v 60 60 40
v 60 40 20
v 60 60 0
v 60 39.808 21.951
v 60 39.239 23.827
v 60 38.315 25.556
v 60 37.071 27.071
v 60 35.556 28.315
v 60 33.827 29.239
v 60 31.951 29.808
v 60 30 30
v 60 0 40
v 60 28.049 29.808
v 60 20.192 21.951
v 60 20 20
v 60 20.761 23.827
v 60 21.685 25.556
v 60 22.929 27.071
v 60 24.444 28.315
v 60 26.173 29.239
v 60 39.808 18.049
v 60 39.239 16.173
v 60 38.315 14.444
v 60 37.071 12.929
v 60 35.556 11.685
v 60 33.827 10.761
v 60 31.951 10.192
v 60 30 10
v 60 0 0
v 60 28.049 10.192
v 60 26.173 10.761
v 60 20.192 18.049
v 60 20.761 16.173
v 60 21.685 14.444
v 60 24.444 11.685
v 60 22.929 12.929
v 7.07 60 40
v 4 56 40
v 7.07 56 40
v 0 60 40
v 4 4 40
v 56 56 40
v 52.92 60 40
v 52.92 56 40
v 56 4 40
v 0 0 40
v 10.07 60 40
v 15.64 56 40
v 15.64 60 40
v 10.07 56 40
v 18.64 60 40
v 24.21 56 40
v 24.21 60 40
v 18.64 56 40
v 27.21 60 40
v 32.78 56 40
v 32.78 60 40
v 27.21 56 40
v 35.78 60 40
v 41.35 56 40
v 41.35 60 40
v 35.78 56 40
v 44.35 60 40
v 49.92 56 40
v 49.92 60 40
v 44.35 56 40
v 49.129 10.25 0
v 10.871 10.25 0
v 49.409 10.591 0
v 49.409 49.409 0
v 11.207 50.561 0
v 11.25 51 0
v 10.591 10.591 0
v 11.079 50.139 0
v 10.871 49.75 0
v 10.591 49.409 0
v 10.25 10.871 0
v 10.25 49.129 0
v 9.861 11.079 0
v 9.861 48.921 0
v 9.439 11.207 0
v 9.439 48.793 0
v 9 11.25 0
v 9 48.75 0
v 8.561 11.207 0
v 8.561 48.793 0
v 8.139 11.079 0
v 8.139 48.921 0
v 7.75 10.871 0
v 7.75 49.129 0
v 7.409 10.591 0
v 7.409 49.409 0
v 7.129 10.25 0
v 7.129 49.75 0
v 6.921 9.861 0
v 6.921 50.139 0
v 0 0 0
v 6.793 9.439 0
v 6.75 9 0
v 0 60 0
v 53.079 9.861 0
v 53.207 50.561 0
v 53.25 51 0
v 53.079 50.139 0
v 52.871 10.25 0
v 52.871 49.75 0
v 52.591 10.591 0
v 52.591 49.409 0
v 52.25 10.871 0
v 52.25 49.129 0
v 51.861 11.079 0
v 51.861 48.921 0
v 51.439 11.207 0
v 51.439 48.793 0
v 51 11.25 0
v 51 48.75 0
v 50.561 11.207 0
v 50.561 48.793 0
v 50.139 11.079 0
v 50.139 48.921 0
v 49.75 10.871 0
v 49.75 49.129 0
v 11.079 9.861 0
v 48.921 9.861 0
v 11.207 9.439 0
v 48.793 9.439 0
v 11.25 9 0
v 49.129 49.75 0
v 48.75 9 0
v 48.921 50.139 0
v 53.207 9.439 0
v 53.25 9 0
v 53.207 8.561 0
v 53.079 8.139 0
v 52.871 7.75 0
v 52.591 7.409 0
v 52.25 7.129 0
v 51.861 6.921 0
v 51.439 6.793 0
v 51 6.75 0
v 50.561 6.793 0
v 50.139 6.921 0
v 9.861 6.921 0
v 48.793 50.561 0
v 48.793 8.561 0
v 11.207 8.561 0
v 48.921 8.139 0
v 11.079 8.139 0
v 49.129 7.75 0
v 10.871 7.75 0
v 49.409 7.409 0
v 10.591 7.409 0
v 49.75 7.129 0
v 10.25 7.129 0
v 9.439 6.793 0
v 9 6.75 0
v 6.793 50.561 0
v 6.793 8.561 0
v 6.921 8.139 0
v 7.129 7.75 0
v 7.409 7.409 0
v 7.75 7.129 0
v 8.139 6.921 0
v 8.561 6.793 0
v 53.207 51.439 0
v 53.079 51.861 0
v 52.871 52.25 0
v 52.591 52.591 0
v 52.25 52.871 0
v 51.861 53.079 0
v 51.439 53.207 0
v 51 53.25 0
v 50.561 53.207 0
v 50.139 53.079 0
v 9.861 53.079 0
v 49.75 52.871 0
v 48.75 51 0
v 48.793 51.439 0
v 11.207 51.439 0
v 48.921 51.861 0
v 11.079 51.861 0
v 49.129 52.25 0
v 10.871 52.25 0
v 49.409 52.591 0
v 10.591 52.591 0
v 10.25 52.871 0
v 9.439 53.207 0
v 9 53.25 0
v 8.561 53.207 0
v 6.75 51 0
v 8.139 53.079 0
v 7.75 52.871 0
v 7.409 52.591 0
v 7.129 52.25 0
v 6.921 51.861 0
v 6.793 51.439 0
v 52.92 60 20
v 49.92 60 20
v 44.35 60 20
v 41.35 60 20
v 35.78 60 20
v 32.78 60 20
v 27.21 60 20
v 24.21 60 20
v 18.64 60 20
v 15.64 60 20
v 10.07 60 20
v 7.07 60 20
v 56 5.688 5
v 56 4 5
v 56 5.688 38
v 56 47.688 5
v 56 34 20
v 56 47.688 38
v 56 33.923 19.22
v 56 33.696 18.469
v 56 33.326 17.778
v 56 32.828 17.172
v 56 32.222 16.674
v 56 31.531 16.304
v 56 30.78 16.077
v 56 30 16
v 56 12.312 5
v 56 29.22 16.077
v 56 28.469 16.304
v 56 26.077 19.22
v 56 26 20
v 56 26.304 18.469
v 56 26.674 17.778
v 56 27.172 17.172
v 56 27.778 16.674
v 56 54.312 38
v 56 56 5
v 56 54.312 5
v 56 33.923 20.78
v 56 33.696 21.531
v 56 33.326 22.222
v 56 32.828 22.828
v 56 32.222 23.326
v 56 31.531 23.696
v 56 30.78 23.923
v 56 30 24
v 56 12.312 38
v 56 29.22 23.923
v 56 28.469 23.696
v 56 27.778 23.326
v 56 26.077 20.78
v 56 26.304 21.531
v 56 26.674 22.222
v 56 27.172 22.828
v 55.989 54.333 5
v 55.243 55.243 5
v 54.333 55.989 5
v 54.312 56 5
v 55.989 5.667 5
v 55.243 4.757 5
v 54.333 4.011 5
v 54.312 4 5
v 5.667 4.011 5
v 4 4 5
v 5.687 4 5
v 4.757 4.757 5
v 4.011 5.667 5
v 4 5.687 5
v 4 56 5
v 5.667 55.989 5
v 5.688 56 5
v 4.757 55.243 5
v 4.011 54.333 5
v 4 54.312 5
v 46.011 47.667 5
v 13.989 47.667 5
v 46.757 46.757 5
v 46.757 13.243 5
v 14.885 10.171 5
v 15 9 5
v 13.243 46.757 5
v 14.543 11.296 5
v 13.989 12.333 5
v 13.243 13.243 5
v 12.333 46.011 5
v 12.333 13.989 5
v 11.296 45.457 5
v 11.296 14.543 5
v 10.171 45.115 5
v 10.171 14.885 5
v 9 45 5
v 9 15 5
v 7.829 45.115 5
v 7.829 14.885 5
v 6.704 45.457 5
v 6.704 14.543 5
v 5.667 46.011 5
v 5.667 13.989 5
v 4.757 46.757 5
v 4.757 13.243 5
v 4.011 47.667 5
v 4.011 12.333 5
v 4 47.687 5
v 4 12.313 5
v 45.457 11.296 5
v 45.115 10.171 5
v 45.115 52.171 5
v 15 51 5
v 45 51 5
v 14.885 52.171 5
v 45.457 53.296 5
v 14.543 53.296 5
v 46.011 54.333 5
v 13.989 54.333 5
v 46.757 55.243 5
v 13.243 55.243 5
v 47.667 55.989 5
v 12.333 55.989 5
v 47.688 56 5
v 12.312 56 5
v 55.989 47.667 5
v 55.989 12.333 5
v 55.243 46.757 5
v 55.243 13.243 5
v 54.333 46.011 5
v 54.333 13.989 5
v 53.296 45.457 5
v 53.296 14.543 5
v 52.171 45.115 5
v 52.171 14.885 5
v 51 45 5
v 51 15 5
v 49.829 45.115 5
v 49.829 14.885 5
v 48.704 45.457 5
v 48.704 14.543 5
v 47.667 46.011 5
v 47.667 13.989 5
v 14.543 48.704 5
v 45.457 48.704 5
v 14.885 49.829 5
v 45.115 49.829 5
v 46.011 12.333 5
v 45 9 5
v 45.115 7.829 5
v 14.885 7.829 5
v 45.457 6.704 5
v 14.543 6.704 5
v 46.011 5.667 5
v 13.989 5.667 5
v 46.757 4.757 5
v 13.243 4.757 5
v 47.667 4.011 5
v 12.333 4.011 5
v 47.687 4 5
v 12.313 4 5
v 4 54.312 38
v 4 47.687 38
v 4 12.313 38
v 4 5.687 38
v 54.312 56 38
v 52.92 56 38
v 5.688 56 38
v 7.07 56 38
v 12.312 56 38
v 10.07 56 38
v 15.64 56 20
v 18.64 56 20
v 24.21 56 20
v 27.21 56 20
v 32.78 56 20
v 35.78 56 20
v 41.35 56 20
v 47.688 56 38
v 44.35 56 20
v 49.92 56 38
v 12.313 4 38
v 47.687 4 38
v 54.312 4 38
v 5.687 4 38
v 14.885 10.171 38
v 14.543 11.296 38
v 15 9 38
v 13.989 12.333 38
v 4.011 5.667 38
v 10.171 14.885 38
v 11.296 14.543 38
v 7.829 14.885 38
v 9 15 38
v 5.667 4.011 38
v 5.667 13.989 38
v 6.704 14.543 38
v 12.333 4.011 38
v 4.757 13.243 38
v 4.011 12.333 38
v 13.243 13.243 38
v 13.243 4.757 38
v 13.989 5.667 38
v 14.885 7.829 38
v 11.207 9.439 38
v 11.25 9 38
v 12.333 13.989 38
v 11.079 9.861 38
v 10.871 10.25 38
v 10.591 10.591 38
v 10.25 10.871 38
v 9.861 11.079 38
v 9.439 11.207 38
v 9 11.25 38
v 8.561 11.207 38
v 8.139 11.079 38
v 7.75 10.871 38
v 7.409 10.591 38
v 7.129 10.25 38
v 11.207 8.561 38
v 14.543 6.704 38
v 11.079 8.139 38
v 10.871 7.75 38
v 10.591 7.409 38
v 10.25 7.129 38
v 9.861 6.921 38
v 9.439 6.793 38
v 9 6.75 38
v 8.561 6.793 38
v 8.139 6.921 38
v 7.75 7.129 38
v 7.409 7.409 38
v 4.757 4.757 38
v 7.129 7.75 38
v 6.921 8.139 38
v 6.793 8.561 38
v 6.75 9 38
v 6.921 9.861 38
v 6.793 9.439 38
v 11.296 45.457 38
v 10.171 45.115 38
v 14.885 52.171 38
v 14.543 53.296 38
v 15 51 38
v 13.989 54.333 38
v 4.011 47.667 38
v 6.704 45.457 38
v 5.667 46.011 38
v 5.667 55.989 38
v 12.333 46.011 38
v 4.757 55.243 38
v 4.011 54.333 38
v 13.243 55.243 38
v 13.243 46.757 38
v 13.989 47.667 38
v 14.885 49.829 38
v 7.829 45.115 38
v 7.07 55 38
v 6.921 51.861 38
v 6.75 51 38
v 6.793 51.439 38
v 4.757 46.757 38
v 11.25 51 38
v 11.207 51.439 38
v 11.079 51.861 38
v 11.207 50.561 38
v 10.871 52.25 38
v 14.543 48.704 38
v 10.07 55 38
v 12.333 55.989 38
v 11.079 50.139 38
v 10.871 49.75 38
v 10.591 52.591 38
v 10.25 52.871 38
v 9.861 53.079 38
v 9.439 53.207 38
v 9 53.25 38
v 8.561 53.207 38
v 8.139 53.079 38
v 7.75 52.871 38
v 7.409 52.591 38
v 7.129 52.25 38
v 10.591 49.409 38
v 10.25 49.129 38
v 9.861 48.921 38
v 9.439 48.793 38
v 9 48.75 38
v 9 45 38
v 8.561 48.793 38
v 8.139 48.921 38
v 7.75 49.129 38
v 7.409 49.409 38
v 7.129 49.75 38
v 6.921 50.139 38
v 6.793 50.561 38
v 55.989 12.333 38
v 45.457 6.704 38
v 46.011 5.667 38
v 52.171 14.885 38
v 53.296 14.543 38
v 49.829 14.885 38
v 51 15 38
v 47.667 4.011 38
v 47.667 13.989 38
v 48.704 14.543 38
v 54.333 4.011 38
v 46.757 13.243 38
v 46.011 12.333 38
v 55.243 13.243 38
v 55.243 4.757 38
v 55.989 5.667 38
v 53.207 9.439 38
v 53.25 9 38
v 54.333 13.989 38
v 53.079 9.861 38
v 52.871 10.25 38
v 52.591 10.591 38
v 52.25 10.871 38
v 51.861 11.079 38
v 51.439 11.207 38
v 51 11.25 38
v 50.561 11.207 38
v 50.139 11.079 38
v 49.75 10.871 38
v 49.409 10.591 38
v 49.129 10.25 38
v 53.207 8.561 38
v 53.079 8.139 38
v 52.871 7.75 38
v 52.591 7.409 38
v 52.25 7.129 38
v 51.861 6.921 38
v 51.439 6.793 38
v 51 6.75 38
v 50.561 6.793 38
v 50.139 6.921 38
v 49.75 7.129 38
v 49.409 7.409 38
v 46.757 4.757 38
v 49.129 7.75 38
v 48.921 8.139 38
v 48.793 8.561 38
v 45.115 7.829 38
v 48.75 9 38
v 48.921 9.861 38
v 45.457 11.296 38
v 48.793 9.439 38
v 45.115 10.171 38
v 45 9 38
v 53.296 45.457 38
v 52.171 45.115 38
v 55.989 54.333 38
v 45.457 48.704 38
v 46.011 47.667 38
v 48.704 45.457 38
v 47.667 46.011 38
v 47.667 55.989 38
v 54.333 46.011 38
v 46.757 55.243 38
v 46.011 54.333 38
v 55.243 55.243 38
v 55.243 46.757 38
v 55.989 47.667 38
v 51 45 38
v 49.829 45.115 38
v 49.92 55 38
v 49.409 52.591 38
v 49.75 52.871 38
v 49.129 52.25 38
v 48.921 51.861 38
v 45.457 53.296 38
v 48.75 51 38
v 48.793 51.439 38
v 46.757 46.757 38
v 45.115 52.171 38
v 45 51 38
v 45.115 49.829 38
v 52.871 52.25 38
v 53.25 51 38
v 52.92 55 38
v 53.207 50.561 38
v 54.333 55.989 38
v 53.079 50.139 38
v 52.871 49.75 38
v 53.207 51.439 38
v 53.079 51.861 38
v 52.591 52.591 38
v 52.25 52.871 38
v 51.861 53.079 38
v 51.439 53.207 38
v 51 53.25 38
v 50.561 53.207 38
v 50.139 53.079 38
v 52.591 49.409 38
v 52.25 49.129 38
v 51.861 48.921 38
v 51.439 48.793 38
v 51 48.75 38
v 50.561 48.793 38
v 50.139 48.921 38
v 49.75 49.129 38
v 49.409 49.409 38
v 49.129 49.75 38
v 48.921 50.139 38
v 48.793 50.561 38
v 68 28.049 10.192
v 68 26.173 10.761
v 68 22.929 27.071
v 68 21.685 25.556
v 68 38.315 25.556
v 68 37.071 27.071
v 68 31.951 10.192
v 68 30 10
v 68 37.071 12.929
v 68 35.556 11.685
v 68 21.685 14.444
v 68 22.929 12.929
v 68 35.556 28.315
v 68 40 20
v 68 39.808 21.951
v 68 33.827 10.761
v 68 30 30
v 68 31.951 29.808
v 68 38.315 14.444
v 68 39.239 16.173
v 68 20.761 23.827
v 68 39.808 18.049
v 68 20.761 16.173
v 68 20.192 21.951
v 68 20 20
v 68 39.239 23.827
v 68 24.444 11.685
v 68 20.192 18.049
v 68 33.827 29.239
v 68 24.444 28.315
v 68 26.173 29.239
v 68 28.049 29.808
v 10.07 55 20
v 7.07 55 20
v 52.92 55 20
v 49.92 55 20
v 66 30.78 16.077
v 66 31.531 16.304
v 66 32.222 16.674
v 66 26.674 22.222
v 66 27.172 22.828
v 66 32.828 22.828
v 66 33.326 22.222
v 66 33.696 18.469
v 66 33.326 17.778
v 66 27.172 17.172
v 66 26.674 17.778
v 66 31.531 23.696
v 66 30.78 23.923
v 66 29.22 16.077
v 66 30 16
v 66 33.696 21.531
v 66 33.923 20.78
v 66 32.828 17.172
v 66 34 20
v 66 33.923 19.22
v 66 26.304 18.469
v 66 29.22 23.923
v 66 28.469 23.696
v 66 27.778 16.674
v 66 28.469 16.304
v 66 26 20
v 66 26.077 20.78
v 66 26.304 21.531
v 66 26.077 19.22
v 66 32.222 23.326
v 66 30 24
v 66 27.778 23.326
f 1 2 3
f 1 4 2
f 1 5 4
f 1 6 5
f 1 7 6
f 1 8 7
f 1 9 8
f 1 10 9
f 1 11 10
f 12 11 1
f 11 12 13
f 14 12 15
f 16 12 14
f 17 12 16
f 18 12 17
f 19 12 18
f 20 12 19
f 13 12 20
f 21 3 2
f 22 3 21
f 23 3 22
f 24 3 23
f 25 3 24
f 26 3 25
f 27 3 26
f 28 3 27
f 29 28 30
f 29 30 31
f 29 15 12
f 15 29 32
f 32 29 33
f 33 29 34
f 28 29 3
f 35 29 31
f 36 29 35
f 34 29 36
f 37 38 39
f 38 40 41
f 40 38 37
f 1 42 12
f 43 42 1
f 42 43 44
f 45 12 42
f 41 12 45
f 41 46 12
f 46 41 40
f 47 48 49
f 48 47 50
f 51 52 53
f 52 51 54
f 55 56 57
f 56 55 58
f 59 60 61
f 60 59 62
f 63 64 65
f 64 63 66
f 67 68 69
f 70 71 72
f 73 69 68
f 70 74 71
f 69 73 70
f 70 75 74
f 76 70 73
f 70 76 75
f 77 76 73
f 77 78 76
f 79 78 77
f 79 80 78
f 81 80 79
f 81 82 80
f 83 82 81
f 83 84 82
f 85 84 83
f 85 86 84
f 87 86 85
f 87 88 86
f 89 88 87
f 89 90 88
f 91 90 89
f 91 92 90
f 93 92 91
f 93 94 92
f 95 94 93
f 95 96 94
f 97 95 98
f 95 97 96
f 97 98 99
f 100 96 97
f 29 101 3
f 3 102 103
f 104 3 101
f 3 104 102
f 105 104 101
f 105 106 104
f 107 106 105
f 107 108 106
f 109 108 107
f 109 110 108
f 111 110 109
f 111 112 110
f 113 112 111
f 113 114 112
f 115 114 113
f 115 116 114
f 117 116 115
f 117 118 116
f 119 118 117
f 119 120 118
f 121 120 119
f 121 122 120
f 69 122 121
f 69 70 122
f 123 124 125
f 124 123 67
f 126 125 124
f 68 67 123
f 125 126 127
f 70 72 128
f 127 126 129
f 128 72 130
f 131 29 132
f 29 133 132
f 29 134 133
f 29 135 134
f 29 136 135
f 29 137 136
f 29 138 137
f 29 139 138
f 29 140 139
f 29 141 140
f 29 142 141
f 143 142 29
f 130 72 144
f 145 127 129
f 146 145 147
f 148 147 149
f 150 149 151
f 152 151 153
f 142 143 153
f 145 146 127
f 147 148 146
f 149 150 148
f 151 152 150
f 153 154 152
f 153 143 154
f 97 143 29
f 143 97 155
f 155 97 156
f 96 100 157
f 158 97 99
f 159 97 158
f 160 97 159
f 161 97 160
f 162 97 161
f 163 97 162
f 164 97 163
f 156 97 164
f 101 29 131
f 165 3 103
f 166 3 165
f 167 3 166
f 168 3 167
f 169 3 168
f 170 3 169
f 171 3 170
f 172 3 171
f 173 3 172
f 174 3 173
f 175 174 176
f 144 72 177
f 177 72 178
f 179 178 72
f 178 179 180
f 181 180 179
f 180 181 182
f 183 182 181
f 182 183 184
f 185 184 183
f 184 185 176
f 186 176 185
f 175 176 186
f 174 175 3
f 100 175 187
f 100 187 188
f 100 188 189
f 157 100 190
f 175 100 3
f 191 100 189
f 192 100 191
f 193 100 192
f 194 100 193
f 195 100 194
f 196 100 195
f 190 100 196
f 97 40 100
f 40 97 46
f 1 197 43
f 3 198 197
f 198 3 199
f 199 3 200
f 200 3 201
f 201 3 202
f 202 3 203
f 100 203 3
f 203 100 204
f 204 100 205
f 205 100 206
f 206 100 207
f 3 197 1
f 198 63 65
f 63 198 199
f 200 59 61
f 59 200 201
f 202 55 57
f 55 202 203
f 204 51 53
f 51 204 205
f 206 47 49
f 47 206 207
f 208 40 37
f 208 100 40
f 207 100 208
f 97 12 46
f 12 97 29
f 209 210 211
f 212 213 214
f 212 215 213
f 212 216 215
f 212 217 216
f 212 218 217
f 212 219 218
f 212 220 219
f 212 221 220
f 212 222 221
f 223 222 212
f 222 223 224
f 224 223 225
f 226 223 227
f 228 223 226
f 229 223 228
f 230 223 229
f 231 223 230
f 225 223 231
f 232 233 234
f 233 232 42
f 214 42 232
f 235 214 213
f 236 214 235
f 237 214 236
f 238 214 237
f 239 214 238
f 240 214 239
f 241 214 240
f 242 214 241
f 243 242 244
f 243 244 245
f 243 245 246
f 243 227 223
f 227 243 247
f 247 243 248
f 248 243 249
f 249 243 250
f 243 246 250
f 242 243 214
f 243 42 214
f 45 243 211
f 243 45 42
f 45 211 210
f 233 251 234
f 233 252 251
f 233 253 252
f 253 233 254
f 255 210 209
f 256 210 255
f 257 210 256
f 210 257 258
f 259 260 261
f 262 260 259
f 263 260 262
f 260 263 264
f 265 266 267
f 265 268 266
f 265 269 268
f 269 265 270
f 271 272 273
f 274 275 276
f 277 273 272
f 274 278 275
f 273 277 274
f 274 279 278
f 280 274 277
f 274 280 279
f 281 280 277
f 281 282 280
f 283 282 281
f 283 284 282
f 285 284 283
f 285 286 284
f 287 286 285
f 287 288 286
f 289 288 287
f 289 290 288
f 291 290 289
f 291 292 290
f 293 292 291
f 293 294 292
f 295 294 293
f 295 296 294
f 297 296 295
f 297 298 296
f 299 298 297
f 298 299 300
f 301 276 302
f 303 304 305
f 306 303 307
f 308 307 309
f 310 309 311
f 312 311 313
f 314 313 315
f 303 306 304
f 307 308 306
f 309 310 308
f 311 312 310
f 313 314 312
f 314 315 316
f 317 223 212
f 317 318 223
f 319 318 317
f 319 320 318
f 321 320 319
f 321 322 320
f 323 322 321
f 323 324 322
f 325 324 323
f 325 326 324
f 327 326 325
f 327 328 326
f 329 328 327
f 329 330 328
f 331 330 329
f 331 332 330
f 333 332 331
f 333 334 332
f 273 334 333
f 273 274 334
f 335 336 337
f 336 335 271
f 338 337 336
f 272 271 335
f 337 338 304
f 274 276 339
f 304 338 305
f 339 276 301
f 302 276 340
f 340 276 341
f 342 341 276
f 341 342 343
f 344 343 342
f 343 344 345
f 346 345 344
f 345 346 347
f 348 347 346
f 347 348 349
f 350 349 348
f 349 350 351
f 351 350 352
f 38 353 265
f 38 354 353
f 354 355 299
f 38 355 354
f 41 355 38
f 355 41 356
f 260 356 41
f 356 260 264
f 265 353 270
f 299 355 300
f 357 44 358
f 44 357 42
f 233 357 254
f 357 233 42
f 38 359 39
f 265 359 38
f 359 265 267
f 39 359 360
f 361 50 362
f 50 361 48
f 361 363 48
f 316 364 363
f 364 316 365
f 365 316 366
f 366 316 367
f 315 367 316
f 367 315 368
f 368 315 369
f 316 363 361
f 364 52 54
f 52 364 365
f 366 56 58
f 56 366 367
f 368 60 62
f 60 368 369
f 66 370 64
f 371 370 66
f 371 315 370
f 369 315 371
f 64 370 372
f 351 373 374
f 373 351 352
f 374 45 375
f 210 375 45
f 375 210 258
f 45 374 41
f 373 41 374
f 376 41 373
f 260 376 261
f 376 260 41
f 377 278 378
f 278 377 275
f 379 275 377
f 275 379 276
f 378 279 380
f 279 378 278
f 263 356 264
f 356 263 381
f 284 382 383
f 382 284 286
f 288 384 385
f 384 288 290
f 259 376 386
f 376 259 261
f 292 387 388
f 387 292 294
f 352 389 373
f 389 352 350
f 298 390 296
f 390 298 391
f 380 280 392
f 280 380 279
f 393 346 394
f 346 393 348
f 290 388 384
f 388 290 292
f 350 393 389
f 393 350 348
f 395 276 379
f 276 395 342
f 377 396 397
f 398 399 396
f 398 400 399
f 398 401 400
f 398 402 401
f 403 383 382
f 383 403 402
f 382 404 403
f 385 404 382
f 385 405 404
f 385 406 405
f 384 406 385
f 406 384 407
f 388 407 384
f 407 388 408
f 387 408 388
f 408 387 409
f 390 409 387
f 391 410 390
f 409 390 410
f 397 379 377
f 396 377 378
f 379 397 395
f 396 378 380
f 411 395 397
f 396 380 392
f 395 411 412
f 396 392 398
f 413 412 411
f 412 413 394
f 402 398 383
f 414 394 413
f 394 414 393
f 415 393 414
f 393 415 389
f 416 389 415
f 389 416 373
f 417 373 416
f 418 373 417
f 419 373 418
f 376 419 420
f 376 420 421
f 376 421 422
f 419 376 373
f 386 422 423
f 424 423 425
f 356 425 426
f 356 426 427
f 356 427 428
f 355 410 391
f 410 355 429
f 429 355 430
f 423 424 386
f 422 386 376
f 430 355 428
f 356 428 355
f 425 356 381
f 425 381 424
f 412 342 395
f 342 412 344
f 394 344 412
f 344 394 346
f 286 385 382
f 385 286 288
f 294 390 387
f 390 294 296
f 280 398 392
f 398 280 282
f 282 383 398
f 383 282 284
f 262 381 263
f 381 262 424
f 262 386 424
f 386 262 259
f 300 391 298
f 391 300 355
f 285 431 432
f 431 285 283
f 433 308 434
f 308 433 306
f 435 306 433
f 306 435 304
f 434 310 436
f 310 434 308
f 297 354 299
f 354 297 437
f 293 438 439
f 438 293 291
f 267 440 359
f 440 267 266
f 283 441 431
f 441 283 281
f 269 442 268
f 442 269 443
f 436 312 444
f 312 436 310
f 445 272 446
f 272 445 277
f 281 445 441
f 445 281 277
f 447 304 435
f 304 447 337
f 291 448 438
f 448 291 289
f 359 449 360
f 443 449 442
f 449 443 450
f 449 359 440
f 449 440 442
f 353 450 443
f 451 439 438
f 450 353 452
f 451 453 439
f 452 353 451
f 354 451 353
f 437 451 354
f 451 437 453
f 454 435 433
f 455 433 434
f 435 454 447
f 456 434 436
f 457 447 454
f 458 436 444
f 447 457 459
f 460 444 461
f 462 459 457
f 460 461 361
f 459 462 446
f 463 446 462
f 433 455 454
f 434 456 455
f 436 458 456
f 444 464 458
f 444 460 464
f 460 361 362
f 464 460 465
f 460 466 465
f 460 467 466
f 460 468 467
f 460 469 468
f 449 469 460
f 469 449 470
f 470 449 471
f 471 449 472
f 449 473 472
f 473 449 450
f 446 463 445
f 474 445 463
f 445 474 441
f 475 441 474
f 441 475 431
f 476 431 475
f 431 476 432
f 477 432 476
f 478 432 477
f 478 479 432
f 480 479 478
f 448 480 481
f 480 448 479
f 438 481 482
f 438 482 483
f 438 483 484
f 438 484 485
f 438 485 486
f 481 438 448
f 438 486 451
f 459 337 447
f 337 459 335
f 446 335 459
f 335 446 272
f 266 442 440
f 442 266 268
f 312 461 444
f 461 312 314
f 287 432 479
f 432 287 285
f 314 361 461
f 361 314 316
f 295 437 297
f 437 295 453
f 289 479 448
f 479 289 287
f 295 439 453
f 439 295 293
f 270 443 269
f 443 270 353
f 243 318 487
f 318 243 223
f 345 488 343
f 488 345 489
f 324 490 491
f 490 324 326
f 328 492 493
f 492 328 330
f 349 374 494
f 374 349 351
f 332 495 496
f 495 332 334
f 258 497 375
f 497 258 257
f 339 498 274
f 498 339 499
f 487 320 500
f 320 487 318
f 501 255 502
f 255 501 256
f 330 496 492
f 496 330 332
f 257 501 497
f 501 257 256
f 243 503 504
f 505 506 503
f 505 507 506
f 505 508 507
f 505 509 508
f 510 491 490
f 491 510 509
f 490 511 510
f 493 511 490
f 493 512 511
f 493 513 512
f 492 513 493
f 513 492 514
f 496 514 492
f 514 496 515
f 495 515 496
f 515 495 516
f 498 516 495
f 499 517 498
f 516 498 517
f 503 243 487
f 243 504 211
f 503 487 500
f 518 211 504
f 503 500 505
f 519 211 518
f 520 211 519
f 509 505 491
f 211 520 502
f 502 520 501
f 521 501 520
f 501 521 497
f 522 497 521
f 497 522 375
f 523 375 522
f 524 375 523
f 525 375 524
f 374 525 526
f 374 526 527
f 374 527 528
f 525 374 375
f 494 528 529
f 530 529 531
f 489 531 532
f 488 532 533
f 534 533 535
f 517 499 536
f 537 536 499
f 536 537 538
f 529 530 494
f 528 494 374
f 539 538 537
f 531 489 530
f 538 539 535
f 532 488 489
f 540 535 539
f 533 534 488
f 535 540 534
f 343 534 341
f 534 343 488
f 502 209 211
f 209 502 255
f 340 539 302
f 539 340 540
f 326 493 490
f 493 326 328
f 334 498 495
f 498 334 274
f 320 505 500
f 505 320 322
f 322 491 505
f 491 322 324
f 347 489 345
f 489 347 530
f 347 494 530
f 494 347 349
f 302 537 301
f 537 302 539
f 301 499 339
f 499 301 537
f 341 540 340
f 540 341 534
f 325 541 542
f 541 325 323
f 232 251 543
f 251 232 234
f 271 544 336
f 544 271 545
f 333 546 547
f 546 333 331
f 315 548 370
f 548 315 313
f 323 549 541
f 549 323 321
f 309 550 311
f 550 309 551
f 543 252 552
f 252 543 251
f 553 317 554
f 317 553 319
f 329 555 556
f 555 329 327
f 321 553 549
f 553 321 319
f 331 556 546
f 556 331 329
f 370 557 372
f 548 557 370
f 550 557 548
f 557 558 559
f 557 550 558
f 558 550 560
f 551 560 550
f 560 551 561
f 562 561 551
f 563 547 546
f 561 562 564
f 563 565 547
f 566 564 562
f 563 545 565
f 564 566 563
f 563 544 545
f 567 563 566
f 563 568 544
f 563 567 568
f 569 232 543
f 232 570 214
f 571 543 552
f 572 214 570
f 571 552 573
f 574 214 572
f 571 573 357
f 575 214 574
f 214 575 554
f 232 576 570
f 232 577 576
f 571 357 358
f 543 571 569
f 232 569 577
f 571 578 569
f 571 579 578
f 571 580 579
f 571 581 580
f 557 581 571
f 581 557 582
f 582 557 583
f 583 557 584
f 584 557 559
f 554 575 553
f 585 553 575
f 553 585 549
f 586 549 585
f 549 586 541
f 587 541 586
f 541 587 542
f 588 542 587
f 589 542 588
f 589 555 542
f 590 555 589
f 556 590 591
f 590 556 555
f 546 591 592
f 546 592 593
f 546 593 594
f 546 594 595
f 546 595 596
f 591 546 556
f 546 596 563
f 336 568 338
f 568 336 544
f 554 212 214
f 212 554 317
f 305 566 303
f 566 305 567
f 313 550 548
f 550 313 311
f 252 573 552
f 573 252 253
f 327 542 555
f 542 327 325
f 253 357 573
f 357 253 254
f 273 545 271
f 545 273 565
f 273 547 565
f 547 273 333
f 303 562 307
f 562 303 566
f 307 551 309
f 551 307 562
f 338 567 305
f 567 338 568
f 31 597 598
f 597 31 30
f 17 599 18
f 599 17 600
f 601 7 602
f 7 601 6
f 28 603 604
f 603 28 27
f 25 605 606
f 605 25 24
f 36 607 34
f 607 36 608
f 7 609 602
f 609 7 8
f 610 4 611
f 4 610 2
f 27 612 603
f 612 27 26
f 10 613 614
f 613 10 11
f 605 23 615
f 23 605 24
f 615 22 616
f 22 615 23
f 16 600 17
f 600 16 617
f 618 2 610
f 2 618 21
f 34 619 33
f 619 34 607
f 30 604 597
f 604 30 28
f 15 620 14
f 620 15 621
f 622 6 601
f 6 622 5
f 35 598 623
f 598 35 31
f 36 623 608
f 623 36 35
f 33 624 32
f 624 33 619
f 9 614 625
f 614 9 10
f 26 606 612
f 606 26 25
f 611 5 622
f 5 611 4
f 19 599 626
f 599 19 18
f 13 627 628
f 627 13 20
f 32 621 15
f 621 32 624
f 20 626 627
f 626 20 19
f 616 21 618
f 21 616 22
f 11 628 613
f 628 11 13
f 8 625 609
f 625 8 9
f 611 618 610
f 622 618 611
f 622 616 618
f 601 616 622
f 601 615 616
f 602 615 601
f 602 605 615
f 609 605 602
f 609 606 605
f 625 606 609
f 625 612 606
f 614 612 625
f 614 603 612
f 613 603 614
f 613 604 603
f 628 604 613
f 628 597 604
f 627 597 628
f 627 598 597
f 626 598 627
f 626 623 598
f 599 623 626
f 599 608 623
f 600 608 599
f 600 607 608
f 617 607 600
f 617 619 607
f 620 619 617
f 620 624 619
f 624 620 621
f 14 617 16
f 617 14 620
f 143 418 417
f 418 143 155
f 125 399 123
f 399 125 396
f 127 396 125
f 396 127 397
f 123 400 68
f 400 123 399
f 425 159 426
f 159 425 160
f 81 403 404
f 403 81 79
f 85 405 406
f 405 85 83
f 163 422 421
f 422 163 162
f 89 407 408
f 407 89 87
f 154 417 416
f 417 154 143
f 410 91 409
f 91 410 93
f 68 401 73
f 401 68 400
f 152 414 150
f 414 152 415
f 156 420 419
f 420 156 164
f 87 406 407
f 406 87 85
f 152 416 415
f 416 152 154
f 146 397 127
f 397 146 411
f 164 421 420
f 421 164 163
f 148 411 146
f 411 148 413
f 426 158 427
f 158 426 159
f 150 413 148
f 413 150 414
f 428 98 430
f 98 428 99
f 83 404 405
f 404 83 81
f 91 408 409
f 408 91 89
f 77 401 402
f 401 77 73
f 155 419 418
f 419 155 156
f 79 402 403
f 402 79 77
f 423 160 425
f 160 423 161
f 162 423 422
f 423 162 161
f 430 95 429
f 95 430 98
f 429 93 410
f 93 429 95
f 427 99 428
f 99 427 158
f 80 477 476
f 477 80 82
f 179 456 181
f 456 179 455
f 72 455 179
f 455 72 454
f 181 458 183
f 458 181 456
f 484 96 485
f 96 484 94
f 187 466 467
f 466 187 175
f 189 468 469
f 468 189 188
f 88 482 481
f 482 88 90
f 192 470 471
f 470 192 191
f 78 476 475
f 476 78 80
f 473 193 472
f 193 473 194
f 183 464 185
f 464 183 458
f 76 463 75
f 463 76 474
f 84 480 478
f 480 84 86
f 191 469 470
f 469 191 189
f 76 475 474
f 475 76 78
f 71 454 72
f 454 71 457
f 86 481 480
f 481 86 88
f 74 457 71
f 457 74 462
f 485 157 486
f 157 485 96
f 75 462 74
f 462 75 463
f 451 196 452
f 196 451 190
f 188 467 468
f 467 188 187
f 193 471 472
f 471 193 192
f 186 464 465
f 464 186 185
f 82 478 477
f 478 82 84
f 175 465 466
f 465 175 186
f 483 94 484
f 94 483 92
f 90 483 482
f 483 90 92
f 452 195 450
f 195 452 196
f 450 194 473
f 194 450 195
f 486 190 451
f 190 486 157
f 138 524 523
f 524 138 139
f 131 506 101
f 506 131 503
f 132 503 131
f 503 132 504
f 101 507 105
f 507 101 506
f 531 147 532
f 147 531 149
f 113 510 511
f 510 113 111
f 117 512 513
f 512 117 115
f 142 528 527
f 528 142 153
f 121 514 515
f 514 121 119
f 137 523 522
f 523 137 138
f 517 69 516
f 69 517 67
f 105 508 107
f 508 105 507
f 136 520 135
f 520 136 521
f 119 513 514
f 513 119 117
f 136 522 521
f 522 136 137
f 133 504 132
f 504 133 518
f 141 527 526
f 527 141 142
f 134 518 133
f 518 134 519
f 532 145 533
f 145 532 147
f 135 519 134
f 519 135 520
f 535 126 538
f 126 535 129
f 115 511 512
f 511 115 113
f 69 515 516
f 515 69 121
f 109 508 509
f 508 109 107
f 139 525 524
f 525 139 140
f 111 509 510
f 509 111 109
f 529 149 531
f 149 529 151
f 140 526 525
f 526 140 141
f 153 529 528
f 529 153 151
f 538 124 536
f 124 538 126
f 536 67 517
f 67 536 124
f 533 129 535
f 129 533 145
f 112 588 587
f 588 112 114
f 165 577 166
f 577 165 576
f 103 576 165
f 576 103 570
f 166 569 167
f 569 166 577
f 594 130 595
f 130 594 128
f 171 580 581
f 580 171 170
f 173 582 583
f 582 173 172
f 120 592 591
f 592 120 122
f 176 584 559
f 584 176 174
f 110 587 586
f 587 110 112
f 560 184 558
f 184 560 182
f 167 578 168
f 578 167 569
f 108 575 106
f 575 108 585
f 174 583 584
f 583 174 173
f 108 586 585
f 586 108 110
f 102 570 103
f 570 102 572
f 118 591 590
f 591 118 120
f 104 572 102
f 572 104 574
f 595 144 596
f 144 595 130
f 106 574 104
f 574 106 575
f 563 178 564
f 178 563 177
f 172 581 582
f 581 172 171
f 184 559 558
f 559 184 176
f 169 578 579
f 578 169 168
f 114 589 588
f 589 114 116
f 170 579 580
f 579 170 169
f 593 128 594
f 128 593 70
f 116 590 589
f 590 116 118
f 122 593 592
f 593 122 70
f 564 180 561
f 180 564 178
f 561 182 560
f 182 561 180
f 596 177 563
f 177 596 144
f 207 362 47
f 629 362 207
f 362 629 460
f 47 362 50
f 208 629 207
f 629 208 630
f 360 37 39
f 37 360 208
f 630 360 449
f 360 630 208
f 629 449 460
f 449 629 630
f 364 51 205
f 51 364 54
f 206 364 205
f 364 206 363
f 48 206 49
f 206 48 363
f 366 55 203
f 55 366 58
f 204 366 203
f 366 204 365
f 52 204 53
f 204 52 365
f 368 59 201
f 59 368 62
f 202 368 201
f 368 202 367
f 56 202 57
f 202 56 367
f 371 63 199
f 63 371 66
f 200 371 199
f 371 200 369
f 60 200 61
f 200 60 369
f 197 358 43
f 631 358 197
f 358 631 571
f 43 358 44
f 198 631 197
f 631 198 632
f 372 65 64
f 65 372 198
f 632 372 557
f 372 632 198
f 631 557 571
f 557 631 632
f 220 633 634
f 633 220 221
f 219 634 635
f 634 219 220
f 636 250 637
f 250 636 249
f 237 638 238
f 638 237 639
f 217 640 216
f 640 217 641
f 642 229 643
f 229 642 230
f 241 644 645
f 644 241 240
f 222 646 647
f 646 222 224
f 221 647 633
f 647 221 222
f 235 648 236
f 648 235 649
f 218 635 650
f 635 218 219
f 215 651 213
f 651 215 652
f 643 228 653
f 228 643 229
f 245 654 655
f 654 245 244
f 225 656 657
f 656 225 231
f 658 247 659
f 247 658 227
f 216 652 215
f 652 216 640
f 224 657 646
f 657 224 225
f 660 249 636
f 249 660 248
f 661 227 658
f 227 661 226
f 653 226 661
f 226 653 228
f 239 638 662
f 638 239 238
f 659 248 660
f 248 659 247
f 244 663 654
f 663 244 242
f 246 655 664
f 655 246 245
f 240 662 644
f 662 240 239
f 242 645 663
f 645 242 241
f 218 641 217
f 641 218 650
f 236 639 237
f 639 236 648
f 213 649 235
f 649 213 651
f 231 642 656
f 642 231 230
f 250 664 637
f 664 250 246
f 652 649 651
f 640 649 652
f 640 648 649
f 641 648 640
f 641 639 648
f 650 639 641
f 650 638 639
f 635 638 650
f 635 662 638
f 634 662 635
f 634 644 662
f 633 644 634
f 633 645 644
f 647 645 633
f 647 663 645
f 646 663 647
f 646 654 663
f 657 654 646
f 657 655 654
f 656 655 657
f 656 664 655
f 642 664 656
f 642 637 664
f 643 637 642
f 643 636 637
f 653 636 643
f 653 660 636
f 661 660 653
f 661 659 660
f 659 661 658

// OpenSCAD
$fn = 32;

// ----------------------------------------------------------------------
// Enclosure body: 60 x 60 x 40 mm, wall 4 mm
// ----------------------------------------------------------------------

// --- parameters (mm) ---
length = 60;              // outside length, X
width = 60;               // outside width, Y
height = 40;              // outside height, Z
wall = 4;                 // side wall thickness
floor_t = 5;              // floor thickness
boss_d = 12;              // corner boss diameter
boss_h = 33;              // corner boss height above the floor
boss_hole_d = 4.5;        // lid screw clearance in the boss
boss_lip = 9;             // boss centre inset from the corner
vent_slots = 6;           // vent slots in the long wall
vent_w = 3;               // vent slot width
vent_h = 20;              // vent slot height
vent_pitch = 8.57;        // vent slot pitch
vent_z = 20;              // vent slot sill height
nipple_d = 20;            // cable gland boss diameter
nipple_h = 8;             // cable gland boss height
nipple_bore = 8;          // cable gland bore

module shell() {
  difference() {
    cube([length, width, height]);
    /* hollow, open at the top */
    translate([wall, wall, floor_t])
      cube([length - 2 * wall, width - 2 * wall, height]);
  }
}

module bosses() {
  /* corner bosses, sunk 1 mm into the floor */
  for (sx = [0, 1]) for (sy = [0, 1])
    translate([sx * (length - 2 * boss_lip) + boss_lip, sy * (width - 2 * boss_lip) + boss_lip, floor_t - 1])
      cylinder(h = boss_h + 1, d = boss_d);
}

module gland() {
  /* boss on the short wall, sunk 1 mm into it */
  translate([length - 1, width / 2, height * 0.5]) rotate([0, 90, 0])
    cylinder(h = nipple_h + 1, d = nipple_d);
}

difference() {
  union() {
    shell();
    bosses();
    gland();
  }
  /* boss screw holes */
  for (sx = [0, 1]) for (sy = [0, 1])
    translate([sx * (length - 2 * boss_lip) + boss_lip, sy * (width - 2 * boss_lip) + boss_lip, -1]) cylinder(h = floor_t + boss_h + 2, d = boss_hole_d);
  /* vent grille in the +Y wall */
  for (i = [0 : vent_slots - 1]) translate([vent_pitch * (i + 1) - vent_w / 2, width - wall - 1, vent_z]) cube([vent_w, wall + 2, vent_h]);
  translate([length, width / 2, height * 0.5]) rotate([0, 90, 0]) translate([0, 0, -nipple_h - 2]) cylinder(h = nipple_h + wall + 4, d = nipple_bore);
}
